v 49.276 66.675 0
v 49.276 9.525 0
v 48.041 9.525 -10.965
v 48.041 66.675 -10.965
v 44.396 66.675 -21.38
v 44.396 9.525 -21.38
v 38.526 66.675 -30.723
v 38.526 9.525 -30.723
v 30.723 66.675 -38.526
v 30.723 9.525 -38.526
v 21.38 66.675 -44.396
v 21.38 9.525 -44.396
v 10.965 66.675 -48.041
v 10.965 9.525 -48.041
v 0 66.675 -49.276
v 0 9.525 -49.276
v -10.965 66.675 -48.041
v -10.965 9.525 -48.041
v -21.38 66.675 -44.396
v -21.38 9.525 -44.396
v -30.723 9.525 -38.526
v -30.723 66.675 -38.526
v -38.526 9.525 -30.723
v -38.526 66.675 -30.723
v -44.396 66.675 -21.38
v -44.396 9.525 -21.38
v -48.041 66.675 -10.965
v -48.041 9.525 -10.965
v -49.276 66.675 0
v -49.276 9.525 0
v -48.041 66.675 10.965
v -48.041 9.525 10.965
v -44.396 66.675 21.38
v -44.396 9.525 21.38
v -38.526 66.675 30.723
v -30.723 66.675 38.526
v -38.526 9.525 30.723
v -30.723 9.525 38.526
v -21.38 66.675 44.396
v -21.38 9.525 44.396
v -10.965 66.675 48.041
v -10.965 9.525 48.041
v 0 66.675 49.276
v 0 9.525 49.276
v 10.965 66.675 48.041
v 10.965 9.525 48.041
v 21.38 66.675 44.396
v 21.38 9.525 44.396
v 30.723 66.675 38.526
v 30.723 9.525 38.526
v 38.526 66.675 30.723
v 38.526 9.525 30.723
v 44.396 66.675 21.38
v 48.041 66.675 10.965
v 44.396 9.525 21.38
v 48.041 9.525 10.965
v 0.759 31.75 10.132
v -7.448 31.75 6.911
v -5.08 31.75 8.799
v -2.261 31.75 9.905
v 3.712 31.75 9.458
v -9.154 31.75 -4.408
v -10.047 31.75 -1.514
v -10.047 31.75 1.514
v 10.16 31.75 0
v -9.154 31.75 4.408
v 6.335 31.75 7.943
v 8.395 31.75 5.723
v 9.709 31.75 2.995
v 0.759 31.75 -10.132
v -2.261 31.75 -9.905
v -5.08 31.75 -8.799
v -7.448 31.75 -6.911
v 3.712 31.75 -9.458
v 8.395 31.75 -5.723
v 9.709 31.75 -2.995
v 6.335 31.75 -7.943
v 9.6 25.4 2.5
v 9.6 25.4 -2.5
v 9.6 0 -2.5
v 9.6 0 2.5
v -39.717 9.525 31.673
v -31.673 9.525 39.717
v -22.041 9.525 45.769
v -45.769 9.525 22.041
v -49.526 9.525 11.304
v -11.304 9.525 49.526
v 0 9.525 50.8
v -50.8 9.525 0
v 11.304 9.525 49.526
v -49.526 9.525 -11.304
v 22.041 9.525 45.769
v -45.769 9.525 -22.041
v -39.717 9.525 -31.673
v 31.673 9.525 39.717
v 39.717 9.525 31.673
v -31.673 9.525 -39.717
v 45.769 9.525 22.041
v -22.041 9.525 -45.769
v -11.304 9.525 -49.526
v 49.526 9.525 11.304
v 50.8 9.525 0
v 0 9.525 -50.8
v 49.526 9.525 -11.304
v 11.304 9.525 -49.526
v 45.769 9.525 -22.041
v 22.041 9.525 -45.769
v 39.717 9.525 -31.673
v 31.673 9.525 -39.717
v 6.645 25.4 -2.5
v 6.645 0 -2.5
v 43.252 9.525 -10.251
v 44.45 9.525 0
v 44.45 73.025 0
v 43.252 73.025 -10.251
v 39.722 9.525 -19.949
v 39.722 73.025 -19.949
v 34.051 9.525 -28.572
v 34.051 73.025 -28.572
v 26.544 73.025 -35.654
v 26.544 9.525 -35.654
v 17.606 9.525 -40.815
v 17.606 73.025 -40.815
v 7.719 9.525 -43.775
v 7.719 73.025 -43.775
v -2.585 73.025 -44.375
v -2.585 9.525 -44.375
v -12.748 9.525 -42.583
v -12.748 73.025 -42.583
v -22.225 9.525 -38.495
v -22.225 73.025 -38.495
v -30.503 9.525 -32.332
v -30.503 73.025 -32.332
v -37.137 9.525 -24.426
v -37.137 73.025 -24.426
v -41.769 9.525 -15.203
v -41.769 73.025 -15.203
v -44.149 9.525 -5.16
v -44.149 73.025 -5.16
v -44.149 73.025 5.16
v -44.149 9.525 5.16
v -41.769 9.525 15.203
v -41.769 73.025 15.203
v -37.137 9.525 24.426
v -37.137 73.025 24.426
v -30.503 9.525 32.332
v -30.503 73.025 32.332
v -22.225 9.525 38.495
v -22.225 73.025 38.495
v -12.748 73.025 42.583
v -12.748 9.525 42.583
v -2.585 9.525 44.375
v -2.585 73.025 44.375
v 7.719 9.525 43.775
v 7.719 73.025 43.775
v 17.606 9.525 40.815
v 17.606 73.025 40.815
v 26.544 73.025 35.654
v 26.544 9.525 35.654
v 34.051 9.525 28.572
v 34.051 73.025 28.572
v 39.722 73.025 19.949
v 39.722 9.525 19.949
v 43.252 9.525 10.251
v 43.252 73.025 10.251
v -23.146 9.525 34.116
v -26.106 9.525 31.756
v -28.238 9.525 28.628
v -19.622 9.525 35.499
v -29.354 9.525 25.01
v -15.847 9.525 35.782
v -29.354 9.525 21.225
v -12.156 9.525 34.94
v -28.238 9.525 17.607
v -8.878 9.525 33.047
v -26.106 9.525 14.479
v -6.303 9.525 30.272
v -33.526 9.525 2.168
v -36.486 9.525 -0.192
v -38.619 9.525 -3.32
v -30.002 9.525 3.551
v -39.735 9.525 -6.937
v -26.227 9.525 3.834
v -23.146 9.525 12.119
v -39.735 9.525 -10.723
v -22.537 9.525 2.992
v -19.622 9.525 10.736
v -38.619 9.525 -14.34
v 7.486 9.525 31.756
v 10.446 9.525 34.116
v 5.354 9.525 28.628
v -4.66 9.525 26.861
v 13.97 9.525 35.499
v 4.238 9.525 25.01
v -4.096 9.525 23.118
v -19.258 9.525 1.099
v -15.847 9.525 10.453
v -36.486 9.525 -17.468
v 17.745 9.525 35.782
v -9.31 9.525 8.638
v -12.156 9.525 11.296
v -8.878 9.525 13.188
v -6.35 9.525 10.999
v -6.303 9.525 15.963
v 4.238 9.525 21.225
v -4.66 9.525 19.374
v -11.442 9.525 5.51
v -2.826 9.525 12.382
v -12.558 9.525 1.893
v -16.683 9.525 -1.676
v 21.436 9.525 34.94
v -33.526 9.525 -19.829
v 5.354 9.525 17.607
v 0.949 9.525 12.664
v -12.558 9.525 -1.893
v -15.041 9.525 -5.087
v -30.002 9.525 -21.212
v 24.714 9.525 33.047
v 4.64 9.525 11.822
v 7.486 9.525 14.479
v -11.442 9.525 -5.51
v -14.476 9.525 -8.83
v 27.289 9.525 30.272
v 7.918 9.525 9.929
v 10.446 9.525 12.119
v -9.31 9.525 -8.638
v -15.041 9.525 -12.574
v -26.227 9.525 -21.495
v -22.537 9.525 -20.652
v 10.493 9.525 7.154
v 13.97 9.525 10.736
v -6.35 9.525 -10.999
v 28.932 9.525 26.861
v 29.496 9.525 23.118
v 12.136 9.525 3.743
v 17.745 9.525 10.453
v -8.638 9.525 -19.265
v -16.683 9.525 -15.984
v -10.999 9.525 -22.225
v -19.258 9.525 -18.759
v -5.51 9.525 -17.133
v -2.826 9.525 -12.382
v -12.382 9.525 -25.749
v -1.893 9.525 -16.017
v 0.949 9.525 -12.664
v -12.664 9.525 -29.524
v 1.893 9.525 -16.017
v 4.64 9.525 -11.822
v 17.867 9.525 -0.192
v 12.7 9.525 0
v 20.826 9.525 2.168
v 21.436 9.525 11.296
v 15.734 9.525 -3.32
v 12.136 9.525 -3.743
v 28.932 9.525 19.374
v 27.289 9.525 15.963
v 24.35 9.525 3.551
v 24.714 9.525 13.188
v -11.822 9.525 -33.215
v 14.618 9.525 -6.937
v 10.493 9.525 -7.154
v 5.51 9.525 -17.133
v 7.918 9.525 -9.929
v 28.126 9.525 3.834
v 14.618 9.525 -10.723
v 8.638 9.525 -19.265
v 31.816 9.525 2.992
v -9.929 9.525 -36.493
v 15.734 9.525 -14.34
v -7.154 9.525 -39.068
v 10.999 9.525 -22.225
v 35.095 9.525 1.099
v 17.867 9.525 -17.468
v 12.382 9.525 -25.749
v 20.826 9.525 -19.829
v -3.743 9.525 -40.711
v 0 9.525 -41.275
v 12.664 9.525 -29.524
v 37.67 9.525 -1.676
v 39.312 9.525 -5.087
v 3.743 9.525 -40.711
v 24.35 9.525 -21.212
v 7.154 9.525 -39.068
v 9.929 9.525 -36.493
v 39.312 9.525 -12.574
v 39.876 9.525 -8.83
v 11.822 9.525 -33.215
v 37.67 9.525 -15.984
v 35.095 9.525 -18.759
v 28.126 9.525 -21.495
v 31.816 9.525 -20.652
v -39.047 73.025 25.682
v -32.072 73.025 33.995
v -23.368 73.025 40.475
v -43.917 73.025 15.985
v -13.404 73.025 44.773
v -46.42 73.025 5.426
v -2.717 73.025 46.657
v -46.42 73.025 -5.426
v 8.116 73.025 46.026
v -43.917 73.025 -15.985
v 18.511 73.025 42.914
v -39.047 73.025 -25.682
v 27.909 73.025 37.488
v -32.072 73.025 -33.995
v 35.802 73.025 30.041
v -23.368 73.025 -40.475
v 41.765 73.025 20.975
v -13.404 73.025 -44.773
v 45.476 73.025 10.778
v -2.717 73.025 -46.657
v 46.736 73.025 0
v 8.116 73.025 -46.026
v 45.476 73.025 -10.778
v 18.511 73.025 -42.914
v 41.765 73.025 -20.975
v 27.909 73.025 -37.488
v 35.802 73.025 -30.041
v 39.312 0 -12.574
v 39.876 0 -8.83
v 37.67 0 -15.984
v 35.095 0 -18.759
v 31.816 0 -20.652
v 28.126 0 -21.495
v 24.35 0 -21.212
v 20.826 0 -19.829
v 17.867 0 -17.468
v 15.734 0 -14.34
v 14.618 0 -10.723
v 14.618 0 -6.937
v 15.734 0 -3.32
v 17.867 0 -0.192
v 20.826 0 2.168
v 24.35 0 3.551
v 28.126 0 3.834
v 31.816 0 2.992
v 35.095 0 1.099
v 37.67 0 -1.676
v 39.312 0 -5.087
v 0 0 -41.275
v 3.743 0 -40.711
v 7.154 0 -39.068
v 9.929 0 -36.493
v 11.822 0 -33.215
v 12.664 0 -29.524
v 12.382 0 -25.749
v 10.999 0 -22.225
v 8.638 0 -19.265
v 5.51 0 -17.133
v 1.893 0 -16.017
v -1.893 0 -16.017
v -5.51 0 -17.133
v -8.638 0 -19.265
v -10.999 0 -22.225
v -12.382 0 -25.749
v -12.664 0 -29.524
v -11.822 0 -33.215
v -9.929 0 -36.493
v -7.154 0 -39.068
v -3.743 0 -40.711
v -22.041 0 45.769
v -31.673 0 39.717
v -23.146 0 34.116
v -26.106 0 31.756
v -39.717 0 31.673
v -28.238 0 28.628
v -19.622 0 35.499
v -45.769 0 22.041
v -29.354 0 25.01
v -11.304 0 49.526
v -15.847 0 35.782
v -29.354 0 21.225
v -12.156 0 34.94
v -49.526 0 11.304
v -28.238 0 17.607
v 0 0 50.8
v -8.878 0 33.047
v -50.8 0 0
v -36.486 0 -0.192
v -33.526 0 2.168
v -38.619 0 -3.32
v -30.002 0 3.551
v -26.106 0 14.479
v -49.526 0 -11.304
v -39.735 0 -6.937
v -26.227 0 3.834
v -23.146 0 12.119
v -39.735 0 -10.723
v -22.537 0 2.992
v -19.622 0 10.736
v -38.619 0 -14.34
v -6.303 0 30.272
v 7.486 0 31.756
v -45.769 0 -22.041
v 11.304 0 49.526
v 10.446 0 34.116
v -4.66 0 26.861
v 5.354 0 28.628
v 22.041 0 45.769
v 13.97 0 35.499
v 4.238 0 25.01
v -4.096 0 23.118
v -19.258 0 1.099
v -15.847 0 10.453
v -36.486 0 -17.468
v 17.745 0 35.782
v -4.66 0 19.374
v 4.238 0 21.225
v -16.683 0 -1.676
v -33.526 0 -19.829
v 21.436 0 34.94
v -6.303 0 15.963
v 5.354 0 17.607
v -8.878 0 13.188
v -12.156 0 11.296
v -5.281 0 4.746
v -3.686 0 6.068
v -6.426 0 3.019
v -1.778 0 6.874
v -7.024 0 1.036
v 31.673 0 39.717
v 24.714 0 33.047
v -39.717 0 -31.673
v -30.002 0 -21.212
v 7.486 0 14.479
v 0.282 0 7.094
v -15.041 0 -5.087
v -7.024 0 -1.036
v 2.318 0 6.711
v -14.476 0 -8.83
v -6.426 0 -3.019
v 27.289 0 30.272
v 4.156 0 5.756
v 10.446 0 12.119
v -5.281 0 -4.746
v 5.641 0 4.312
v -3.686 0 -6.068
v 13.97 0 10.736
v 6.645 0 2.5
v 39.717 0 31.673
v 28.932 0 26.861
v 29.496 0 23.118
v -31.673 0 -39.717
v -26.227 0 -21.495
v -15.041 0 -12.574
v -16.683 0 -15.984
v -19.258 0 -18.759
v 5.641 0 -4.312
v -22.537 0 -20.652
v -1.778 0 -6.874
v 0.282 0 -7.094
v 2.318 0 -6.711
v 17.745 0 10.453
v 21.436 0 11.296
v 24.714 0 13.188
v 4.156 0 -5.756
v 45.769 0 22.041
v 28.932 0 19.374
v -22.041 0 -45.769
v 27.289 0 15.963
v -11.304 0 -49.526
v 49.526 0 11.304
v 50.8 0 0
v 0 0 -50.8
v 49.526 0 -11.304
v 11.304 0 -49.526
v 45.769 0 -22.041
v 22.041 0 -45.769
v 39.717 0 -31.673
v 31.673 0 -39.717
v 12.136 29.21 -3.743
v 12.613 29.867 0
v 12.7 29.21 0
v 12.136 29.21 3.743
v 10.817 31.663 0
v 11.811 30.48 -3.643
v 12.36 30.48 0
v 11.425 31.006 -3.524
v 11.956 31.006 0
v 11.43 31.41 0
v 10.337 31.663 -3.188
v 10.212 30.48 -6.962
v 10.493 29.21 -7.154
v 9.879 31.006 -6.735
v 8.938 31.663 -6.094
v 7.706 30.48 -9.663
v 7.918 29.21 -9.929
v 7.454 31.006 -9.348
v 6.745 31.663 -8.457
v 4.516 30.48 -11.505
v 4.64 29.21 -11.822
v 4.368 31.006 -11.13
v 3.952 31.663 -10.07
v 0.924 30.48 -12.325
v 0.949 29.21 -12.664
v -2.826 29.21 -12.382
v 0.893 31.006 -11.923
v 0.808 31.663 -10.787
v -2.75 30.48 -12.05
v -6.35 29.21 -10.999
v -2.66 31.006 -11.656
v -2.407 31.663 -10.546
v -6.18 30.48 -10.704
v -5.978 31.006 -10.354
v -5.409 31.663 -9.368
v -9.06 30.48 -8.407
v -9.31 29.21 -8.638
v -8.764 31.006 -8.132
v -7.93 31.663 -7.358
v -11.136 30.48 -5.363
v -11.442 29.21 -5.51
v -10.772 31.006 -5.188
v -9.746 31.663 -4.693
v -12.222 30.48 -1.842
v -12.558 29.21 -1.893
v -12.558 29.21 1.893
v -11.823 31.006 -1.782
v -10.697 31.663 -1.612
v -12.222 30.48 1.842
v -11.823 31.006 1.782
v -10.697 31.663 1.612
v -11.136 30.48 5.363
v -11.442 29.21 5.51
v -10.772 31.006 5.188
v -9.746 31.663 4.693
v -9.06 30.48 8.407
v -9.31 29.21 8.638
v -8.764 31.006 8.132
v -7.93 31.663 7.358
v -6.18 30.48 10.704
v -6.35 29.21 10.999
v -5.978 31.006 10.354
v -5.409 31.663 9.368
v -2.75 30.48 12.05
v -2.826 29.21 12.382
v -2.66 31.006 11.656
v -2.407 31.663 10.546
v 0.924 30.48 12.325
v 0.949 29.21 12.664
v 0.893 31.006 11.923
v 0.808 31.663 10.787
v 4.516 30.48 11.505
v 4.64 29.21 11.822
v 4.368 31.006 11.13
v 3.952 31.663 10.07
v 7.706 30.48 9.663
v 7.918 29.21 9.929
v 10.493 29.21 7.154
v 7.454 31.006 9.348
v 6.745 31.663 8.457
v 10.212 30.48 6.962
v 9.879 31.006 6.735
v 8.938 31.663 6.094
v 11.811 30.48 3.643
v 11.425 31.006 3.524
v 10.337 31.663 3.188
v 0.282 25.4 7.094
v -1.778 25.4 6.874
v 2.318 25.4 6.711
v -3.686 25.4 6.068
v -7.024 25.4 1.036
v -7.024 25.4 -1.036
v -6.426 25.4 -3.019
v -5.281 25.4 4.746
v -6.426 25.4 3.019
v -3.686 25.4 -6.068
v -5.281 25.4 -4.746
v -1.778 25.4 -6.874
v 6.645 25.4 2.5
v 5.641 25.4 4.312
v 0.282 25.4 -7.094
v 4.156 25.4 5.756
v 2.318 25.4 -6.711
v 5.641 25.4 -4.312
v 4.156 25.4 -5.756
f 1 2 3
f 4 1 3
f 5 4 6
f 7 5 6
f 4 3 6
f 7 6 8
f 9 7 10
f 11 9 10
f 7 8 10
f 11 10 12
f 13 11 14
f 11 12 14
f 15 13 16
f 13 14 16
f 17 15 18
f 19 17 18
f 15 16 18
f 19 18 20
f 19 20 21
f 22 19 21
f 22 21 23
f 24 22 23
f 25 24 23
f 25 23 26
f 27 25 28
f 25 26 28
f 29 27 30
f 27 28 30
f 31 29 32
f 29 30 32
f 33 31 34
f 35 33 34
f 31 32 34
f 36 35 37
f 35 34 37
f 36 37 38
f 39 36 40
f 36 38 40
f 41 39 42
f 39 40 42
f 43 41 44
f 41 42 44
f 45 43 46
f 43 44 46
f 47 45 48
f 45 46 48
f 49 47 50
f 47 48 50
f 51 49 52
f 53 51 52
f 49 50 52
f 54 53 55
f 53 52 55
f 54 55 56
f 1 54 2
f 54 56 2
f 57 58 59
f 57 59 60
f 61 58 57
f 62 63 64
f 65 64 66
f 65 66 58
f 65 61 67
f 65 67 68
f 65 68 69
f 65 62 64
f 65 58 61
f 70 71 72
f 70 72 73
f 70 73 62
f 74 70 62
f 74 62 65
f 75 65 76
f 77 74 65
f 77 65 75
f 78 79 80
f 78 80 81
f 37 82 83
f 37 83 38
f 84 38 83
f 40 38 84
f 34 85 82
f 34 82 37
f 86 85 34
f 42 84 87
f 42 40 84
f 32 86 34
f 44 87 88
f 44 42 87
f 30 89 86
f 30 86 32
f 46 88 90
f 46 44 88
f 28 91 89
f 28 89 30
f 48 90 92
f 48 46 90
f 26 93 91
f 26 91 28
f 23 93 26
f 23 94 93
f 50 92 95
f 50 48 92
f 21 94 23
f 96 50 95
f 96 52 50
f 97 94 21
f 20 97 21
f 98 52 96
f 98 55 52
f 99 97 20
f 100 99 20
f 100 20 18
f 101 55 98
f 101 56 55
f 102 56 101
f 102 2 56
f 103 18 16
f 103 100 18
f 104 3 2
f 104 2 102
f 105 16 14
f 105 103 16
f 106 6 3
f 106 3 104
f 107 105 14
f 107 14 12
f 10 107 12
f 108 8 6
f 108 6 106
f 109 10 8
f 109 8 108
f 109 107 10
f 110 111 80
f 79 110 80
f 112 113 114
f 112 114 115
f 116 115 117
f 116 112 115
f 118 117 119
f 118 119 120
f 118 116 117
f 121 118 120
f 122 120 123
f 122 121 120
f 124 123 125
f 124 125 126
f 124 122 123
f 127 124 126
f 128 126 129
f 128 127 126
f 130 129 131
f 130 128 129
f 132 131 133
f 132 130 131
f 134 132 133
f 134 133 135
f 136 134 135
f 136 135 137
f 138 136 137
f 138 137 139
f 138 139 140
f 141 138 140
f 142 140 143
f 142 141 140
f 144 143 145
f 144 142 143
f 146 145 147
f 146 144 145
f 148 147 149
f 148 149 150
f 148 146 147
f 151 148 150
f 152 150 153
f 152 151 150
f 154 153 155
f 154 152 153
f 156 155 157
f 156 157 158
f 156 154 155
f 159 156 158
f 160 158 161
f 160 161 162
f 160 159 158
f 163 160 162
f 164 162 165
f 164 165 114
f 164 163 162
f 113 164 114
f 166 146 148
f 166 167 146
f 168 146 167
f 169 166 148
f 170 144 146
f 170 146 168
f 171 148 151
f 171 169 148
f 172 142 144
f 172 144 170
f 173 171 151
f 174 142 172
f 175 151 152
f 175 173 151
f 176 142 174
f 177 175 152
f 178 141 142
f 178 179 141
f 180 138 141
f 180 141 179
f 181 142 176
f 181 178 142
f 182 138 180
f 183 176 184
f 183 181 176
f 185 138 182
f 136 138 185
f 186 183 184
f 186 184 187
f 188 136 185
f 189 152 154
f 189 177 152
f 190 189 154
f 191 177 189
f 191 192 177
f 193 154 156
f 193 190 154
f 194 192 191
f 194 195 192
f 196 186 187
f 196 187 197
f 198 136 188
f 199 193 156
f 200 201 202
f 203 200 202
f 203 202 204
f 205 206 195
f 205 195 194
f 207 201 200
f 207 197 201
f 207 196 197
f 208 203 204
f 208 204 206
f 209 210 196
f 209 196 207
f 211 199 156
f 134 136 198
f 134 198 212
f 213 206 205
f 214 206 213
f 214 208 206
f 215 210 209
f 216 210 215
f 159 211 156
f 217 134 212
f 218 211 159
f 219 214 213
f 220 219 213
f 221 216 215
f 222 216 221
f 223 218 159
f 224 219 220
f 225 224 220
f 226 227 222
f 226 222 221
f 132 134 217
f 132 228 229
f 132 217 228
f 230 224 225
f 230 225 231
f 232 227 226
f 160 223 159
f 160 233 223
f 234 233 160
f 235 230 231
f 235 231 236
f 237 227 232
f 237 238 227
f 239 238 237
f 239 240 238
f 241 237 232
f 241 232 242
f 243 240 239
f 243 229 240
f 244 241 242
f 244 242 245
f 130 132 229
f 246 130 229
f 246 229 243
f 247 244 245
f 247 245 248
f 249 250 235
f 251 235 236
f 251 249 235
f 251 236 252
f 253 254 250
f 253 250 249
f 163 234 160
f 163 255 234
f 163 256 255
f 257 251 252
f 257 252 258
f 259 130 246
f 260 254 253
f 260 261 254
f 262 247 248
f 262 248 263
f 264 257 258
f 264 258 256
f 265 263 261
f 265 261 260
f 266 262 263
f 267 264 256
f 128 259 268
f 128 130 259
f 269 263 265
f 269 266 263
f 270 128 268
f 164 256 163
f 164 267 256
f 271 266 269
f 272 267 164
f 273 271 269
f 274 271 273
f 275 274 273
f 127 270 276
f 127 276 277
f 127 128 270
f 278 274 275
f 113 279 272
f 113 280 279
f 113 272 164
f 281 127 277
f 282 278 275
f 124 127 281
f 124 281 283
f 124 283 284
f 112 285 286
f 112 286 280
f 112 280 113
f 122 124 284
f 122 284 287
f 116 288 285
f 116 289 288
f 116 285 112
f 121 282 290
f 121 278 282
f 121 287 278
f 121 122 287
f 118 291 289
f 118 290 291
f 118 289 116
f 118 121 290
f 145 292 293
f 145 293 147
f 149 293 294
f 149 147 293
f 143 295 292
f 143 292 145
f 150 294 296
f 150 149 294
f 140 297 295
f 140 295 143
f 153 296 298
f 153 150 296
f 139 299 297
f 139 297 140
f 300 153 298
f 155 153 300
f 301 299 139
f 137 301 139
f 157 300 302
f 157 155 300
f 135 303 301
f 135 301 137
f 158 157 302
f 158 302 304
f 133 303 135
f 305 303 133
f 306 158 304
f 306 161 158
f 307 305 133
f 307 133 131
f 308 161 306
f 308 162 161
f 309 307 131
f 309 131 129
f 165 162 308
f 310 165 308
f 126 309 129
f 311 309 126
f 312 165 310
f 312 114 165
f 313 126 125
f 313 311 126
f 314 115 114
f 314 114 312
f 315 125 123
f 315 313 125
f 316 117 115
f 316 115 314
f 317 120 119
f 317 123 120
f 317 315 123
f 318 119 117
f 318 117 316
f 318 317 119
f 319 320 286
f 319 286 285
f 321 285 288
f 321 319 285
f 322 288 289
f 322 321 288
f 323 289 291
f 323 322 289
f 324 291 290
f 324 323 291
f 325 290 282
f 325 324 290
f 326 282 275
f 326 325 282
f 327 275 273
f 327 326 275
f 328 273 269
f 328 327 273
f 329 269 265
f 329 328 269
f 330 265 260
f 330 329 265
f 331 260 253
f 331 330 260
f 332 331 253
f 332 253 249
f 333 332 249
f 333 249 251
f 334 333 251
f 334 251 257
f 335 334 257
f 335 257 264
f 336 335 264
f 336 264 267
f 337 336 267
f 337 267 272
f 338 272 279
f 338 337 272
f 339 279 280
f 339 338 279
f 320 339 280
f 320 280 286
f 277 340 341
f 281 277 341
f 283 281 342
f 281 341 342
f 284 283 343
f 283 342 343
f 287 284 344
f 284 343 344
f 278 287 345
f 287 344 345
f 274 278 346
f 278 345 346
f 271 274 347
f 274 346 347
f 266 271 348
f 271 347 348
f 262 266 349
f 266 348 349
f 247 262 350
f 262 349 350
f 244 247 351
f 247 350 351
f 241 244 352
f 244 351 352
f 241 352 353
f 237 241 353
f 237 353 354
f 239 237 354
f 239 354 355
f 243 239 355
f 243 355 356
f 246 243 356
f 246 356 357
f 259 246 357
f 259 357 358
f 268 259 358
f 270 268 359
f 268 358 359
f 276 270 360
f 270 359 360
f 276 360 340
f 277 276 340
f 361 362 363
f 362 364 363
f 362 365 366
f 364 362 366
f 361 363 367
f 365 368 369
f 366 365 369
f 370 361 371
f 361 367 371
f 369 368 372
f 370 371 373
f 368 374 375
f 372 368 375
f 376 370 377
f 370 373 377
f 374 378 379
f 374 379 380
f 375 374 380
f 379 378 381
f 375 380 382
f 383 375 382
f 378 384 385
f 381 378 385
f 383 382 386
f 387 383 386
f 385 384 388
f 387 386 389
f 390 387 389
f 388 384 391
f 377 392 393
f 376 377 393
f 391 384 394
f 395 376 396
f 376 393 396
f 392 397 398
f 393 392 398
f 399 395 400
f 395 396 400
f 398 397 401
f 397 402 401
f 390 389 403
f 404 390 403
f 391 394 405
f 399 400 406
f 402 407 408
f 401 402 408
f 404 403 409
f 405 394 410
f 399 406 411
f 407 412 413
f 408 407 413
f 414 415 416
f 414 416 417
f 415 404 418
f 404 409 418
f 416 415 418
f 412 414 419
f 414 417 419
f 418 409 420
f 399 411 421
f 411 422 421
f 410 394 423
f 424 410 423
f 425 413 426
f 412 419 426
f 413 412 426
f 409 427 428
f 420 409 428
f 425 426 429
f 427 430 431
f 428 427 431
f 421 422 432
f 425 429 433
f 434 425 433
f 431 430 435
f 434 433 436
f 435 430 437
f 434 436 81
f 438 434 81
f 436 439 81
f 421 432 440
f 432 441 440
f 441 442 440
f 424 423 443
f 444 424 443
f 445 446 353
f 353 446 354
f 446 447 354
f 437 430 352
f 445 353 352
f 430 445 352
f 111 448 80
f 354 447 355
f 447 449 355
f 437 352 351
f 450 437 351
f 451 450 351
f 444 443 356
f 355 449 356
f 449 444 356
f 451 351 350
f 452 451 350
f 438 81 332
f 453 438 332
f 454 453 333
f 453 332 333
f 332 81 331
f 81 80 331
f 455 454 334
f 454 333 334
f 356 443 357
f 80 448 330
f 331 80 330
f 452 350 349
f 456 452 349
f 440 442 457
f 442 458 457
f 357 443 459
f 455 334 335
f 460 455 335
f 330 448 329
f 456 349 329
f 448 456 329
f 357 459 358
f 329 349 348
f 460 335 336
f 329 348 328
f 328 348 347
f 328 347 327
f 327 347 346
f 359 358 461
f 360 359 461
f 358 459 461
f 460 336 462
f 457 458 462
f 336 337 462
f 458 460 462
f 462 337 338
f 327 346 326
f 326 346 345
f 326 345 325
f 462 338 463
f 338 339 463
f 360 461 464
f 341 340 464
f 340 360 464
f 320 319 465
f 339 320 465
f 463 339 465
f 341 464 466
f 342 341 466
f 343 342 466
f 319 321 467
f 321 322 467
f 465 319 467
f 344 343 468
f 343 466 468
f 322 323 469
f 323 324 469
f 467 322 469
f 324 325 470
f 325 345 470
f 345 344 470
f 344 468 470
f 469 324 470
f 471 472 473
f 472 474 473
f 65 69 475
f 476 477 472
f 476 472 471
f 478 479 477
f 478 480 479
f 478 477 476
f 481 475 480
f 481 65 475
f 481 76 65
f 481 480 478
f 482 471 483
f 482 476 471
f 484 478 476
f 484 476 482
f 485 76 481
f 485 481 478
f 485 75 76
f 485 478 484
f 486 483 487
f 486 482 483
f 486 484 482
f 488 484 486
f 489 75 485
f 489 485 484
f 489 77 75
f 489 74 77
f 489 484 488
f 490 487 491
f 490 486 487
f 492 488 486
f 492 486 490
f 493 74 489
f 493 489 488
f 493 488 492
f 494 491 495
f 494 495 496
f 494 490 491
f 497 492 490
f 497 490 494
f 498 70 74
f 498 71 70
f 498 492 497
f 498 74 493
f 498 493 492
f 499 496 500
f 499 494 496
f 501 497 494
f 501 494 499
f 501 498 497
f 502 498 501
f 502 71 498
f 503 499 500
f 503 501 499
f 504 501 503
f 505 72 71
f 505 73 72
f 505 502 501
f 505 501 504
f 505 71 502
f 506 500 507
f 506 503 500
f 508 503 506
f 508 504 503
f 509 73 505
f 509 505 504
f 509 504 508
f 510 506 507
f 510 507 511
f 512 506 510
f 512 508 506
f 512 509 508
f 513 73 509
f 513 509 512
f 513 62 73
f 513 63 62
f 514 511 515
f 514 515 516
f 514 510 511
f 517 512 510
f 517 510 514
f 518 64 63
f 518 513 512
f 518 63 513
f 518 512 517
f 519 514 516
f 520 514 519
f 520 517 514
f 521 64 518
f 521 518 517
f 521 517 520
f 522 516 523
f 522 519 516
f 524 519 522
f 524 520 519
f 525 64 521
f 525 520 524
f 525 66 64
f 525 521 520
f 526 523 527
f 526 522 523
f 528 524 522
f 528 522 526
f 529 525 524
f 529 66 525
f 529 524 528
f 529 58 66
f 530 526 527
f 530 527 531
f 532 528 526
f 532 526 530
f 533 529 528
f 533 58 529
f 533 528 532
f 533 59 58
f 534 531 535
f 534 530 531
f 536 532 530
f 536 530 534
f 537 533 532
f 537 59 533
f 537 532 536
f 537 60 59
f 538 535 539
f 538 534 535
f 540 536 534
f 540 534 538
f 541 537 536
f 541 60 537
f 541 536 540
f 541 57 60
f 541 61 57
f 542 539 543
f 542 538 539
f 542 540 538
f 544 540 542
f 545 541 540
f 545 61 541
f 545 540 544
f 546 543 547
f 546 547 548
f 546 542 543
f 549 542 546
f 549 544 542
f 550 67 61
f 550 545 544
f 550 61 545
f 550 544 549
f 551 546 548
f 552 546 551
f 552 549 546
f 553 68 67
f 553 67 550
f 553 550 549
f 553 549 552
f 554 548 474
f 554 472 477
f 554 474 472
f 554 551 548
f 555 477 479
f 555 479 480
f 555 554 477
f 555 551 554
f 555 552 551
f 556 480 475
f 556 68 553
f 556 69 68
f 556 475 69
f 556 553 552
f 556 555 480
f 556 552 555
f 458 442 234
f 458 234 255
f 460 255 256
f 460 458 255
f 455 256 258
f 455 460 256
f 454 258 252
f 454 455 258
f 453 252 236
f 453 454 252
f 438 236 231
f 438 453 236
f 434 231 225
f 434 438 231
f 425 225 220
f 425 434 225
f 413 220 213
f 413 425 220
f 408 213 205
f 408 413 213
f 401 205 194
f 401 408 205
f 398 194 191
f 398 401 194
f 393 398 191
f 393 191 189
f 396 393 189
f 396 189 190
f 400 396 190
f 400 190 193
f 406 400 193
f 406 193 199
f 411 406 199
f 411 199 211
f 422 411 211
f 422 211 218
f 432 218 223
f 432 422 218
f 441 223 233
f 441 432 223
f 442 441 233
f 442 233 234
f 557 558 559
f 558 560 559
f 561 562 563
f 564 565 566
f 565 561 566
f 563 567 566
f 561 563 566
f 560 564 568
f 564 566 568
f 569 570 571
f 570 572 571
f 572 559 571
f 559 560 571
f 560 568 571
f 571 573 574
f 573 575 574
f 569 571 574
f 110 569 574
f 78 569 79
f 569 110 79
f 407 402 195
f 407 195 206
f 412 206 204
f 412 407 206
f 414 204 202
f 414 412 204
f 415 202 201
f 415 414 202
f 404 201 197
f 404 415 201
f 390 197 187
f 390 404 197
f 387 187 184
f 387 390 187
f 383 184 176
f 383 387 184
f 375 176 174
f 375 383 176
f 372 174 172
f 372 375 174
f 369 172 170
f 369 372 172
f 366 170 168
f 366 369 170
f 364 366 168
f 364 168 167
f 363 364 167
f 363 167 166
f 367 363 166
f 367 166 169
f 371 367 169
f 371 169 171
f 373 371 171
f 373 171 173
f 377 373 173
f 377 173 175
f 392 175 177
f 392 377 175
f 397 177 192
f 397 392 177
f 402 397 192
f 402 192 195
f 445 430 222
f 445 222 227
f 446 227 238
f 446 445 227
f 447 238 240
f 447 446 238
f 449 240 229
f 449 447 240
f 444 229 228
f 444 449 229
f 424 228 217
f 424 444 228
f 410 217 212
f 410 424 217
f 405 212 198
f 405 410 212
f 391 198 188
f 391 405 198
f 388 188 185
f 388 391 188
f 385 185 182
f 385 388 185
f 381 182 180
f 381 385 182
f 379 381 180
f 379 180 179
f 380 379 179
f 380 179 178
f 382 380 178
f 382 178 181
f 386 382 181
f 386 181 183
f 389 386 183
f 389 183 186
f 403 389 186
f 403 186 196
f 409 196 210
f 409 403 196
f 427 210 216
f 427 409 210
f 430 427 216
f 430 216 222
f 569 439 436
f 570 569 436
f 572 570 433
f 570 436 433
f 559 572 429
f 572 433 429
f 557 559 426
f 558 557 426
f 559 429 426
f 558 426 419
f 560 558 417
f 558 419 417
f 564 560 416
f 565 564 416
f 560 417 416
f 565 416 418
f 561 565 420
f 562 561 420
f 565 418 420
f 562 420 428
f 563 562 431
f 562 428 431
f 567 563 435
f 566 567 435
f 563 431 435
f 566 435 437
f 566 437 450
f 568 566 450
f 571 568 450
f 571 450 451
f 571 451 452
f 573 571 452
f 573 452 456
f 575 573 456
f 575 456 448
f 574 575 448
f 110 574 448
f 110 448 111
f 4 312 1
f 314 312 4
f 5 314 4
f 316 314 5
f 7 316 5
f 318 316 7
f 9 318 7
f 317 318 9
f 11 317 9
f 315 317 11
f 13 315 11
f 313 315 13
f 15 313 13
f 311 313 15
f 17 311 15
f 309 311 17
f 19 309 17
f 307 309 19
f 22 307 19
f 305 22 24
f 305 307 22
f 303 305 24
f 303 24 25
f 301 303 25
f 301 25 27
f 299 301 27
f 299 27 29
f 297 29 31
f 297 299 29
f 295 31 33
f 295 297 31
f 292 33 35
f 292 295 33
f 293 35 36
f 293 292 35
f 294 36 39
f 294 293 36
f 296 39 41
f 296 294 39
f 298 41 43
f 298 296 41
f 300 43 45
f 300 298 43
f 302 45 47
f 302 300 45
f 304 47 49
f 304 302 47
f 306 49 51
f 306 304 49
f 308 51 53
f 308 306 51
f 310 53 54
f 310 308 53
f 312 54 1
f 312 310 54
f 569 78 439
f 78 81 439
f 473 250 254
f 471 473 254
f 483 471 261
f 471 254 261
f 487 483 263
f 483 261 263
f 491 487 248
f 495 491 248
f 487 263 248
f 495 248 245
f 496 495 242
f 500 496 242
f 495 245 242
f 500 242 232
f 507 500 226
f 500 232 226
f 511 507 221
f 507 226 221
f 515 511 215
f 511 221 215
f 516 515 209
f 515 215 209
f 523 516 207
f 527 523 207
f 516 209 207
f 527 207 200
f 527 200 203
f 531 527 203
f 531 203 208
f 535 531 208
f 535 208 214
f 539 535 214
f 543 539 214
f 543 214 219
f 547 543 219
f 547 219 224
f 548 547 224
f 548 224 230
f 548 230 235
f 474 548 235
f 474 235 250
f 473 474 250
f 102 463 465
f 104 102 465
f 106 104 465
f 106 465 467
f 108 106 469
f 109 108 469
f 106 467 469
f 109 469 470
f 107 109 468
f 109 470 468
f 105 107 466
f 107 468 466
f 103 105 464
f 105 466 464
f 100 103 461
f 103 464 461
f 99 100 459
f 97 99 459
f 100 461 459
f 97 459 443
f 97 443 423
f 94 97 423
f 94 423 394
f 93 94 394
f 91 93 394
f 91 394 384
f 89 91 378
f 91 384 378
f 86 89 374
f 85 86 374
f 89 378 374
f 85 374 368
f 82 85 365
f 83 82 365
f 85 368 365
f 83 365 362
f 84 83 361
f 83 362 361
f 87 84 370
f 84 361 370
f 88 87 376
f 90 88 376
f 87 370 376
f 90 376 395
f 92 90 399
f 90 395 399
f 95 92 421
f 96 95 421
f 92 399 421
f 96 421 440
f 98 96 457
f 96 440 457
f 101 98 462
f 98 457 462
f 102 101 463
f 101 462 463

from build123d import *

# Parameters (mm, degrees)
SKETCH1_R           = 50.8
SKETCH1_R_2         = 12.7
BOSS_EXTRUDE1_DEPTH = 9.525
SKETCH2_R           = 49.276
SKETCH2_R_2         = 44.45
BOSS_EXTRUDE2_DEPTH = 63.5
SKETCH3_R           = 12.7
BOSS_EXTRUDE3_DEPTH = 15.875
CHAMFER1_SIZE       = 6.35
CHAMFER1_SIZE2      = 2.54
SKETCH4_R           = 12.7
BOSS_EXTRUDE4_DEPTH = 6.35
FILLET1_R           = 2.54


with BuildPart() as part:
    # Sketch1 → Boss-Extrude1 (new body)
    with BuildSketch(Plane(origin=(0, 0, 0), x_dir=(1, 0, 0), z_dir=(0, 1, 0))):
        Circle(SKETCH1_R)
        with Locations((-16.795963584, -23.117660614)):
            Circle(SKETCH1_R_2, mode=Mode.SUBTRACT)
        with Locations((16.795963584, -23.117660614)):
            Circle(SKETCH1_R_2, mode=Mode.SUBTRACT)
        with BuildLine():
            Line((9.6, -2.5), (6.64529909, -2.5))
            ThreePointArc((6.64529909, -2.5), (-7.1, 0), (6.64529909, 2.5))
            Line((6.64529909, 2.5), (9.6, 2.5))
            Line((9.6, 2.5), (9.6, -2.5))
        make_face(mode=Mode.SUBTRACT)
        with Locations((-27.176439953, 8.830160614)):
            Circle(SKETCH1_R_2, mode=Mode.SUBTRACT)
        with BuildLine():
            ThreePointArc((0, 15.875), (-12.7, 28.575), (0, 41.275))
            ThreePointArc((0, 41.275), (12.7, 28.575), (0, 15.875))
        make_face(mode=Mode.SUBTRACT)
        with Locations((27.176439953, 8.830160614)):
            Circle(SKETCH1_R_2, mode=Mode.SUBTRACT)
    extrude(amount=BOSS_EXTRUDE1_DEPTH)

    # Sketch2 → Boss-Extrude2 (add)
    with BuildSketch(Plane(origin=(0, 9.525, 0), x_dir=(1, 0, 0), z_dir=(0, 1, 0))):
        Circle(SKETCH2_R)
        Circle(SKETCH2_R_2, mode=Mode.SUBTRACT)
    extrude(amount=BOSS_EXTRUDE2_DEPTH)

    # Sketch3 → Boss-Extrude3 (add)
    with BuildSketch(Plane(origin=(0, 9.525, 0), x_dir=(1, 0, 0), z_dir=(0, 1, 0))):
        Circle(SKETCH3_R)
        with BuildLine():
            Line((9.6, -2.5), (6.64529909, -2.5))
            ThreePointArc((6.64529909, -2.5), (-7.1, 0), (6.64529909, 2.5))
            Line((6.64529909, 2.5), (9.6, 2.5))
            Line((9.6, 2.5), (9.6, -2.5))
        make_face(mode=Mode.SUBTRACT)
    extrude(amount=BOSS_EXTRUDE3_DEPTH)

    # Chamfer1
    chamfer1_edges = [part.edges().sort_by_distance(p)[0] for p in [
        (-49.276, 73.025, 0),
    ]]
    chamfer1_side = [part.faces().sort_by_distance(p)[0] for p in [
        (-49.276, 41.275, 0),
    ]]
    chamfer(chamfer1_edges, length=CHAMFER1_SIZE, length2=CHAMFER1_SIZE2, reference=chamfer1_side[0])

    # Sketch4 → Boss-Extrude4 (add)
    with BuildSketch(Plane(origin=(0, 25.4, 0), x_dir=(1, 0, 0), z_dir=(0, 1, 0))):
        Circle(SKETCH4_R)
    extrude(amount=BOSS_EXTRUDE4_DEPTH)

    # Fillet1
    fillet1_edges = [part.edges().sort_by_distance(p)[0] for p in [
        (-12.7, 31.75, 0),
    ]]
    fillet(fillet1_edges, radius=FILLET1_R)


solid = part.part
